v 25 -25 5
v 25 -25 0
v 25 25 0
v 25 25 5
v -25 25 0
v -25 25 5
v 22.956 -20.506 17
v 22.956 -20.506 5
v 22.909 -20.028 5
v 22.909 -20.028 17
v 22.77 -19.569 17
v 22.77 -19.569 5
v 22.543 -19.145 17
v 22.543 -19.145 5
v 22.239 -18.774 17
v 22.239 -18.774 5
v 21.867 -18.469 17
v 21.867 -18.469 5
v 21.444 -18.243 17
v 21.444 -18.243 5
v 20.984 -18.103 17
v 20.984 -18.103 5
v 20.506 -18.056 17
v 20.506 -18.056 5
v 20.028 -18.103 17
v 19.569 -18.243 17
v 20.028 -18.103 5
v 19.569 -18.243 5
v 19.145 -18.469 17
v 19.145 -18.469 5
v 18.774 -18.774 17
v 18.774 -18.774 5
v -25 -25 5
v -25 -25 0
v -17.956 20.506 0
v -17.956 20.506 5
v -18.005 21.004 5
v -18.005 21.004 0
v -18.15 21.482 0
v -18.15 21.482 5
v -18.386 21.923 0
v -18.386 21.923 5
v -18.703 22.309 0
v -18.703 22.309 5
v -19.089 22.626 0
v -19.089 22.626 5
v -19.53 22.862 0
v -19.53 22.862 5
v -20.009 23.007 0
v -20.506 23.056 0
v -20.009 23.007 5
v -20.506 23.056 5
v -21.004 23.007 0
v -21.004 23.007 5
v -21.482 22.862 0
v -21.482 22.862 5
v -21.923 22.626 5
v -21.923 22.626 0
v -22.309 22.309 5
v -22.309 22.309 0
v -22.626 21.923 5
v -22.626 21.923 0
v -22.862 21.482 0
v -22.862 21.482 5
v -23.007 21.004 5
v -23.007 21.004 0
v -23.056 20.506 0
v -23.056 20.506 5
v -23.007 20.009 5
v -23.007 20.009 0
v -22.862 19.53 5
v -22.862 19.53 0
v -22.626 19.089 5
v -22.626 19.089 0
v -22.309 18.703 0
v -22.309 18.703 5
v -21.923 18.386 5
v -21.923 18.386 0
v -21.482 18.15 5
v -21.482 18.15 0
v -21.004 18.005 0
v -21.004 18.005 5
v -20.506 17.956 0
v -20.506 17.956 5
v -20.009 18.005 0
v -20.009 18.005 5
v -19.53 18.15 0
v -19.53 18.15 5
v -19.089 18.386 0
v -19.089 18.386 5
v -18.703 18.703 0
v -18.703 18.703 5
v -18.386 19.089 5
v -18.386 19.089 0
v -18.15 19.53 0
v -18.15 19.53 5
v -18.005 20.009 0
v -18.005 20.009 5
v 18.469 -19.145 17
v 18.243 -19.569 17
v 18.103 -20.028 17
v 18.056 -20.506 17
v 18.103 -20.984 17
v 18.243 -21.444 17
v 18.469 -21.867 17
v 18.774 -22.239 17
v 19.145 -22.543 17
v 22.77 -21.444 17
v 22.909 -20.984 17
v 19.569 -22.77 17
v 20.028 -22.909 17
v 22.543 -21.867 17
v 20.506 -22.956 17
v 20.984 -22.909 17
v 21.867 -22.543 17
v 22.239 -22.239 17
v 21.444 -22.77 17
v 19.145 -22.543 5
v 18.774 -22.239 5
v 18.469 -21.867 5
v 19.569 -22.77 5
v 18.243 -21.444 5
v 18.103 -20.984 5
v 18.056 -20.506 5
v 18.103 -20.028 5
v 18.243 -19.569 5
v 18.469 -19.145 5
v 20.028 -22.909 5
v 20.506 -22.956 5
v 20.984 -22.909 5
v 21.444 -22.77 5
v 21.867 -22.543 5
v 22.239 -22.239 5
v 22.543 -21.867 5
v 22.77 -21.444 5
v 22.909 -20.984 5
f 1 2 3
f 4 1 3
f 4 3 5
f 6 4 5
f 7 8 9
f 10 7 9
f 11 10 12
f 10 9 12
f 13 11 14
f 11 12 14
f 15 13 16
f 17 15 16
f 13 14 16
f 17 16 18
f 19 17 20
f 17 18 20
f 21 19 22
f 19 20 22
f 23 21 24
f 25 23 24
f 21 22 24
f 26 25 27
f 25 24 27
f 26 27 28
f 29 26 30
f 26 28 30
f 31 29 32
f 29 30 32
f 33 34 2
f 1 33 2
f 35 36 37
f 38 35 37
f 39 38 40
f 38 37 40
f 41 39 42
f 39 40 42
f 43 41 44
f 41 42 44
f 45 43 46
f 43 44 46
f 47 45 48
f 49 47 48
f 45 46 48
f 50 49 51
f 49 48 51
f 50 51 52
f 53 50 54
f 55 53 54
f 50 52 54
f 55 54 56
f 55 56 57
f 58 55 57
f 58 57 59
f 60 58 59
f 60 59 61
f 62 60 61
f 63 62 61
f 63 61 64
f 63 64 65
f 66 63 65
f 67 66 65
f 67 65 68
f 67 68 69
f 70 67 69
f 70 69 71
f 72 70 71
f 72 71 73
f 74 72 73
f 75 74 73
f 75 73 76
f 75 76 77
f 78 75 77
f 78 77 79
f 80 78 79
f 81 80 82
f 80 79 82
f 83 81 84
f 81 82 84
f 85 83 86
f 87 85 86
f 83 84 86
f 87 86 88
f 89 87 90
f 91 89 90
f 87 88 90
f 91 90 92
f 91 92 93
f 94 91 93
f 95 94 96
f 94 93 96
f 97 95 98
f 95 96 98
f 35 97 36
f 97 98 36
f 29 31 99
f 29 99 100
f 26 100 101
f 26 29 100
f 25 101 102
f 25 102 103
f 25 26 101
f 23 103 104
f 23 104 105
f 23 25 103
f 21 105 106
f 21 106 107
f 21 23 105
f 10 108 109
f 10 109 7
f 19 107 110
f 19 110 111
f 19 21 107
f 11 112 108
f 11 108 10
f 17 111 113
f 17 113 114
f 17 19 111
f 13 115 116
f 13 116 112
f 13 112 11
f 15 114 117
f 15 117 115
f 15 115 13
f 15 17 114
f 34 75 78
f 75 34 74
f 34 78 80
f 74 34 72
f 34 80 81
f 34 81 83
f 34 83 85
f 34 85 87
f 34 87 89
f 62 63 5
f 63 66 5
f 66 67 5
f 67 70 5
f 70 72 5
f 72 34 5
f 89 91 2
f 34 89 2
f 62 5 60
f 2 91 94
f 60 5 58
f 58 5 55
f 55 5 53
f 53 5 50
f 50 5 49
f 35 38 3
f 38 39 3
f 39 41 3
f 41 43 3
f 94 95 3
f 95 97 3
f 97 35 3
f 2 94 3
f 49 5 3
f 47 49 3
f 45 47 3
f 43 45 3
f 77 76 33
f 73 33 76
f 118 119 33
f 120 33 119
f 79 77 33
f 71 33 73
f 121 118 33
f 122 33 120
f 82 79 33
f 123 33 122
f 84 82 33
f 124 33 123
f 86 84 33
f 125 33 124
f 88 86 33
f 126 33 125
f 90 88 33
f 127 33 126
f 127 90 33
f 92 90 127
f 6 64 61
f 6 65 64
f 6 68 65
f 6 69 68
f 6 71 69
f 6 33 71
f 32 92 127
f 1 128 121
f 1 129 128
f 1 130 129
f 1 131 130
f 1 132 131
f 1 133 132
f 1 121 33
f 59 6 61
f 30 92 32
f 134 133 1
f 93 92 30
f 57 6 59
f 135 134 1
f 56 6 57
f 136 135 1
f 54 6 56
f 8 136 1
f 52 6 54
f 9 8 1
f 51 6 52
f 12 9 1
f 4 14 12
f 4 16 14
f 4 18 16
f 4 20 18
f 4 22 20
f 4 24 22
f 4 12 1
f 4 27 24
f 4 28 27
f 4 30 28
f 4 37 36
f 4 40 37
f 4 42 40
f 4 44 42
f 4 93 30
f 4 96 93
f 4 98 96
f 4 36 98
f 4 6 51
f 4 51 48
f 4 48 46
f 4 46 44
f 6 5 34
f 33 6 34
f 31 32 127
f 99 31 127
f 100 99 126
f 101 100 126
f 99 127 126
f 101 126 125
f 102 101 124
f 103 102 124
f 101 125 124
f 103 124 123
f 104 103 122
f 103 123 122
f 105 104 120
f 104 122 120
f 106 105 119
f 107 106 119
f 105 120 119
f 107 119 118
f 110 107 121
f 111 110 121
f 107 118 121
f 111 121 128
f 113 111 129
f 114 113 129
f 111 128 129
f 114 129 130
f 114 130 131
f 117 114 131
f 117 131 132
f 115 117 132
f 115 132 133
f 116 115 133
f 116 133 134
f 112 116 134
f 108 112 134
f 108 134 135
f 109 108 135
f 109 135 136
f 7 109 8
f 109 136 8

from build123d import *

# Parameters (mm, degrees)
F0_W     = 25
F0_H     = 25
F1_DEPTH = 5
F3_DEPTH = 12
F4_DEPTH = 5.001


with BuildPart() as f1:
    # F0 (on Top) → F1 (new body)
    with BuildSketch(Plane.XY):
        with Locations((-12.5, 12.5)):
            Rectangle(F0_W, F0_H)
        Polygon((25, 25), (0, 25), (0, 0), (-25, 0), (-25, -25), (25, -25), align=None)
    extrude(amount=F1_DEPTH)

    # F2 (on face) → F3 (join)
    with BuildSketch(Plane.XY.offset(5)):
        with BuildLine():
            ThreePointArc((18.7736850405, -18.7736850405), (19.5685222451, -22.7696015091), (22.9560966544, -20.5060966544))
            ThreePointArc((22.9560966544, -20.5060966544), (21.4436710637, -18.2425917998), (18.7736850405, -18.7736850405))
        make_face()
    extrude(amount=F3_DEPTH)

    # F2 (on face) → F4 (cut, through all)
    with BuildSketch(Plane.XY.offset(5)):
        with BuildLine():
            ThreePointArc((-17.9560966544, 20.5060966544), (-22.8619894623, 21.4819394069), (-18.7029743624, 18.7029743624))
            ThreePointArc((-18.7029743624, 18.7029743624), (-18.1502038465, 19.5302539019), (-17.9560966544, 20.5060966544))
        make_face()
    extrude(amount=-F4_DEPTH, mode=Mode.SUBTRACT)


solid = f1.part
